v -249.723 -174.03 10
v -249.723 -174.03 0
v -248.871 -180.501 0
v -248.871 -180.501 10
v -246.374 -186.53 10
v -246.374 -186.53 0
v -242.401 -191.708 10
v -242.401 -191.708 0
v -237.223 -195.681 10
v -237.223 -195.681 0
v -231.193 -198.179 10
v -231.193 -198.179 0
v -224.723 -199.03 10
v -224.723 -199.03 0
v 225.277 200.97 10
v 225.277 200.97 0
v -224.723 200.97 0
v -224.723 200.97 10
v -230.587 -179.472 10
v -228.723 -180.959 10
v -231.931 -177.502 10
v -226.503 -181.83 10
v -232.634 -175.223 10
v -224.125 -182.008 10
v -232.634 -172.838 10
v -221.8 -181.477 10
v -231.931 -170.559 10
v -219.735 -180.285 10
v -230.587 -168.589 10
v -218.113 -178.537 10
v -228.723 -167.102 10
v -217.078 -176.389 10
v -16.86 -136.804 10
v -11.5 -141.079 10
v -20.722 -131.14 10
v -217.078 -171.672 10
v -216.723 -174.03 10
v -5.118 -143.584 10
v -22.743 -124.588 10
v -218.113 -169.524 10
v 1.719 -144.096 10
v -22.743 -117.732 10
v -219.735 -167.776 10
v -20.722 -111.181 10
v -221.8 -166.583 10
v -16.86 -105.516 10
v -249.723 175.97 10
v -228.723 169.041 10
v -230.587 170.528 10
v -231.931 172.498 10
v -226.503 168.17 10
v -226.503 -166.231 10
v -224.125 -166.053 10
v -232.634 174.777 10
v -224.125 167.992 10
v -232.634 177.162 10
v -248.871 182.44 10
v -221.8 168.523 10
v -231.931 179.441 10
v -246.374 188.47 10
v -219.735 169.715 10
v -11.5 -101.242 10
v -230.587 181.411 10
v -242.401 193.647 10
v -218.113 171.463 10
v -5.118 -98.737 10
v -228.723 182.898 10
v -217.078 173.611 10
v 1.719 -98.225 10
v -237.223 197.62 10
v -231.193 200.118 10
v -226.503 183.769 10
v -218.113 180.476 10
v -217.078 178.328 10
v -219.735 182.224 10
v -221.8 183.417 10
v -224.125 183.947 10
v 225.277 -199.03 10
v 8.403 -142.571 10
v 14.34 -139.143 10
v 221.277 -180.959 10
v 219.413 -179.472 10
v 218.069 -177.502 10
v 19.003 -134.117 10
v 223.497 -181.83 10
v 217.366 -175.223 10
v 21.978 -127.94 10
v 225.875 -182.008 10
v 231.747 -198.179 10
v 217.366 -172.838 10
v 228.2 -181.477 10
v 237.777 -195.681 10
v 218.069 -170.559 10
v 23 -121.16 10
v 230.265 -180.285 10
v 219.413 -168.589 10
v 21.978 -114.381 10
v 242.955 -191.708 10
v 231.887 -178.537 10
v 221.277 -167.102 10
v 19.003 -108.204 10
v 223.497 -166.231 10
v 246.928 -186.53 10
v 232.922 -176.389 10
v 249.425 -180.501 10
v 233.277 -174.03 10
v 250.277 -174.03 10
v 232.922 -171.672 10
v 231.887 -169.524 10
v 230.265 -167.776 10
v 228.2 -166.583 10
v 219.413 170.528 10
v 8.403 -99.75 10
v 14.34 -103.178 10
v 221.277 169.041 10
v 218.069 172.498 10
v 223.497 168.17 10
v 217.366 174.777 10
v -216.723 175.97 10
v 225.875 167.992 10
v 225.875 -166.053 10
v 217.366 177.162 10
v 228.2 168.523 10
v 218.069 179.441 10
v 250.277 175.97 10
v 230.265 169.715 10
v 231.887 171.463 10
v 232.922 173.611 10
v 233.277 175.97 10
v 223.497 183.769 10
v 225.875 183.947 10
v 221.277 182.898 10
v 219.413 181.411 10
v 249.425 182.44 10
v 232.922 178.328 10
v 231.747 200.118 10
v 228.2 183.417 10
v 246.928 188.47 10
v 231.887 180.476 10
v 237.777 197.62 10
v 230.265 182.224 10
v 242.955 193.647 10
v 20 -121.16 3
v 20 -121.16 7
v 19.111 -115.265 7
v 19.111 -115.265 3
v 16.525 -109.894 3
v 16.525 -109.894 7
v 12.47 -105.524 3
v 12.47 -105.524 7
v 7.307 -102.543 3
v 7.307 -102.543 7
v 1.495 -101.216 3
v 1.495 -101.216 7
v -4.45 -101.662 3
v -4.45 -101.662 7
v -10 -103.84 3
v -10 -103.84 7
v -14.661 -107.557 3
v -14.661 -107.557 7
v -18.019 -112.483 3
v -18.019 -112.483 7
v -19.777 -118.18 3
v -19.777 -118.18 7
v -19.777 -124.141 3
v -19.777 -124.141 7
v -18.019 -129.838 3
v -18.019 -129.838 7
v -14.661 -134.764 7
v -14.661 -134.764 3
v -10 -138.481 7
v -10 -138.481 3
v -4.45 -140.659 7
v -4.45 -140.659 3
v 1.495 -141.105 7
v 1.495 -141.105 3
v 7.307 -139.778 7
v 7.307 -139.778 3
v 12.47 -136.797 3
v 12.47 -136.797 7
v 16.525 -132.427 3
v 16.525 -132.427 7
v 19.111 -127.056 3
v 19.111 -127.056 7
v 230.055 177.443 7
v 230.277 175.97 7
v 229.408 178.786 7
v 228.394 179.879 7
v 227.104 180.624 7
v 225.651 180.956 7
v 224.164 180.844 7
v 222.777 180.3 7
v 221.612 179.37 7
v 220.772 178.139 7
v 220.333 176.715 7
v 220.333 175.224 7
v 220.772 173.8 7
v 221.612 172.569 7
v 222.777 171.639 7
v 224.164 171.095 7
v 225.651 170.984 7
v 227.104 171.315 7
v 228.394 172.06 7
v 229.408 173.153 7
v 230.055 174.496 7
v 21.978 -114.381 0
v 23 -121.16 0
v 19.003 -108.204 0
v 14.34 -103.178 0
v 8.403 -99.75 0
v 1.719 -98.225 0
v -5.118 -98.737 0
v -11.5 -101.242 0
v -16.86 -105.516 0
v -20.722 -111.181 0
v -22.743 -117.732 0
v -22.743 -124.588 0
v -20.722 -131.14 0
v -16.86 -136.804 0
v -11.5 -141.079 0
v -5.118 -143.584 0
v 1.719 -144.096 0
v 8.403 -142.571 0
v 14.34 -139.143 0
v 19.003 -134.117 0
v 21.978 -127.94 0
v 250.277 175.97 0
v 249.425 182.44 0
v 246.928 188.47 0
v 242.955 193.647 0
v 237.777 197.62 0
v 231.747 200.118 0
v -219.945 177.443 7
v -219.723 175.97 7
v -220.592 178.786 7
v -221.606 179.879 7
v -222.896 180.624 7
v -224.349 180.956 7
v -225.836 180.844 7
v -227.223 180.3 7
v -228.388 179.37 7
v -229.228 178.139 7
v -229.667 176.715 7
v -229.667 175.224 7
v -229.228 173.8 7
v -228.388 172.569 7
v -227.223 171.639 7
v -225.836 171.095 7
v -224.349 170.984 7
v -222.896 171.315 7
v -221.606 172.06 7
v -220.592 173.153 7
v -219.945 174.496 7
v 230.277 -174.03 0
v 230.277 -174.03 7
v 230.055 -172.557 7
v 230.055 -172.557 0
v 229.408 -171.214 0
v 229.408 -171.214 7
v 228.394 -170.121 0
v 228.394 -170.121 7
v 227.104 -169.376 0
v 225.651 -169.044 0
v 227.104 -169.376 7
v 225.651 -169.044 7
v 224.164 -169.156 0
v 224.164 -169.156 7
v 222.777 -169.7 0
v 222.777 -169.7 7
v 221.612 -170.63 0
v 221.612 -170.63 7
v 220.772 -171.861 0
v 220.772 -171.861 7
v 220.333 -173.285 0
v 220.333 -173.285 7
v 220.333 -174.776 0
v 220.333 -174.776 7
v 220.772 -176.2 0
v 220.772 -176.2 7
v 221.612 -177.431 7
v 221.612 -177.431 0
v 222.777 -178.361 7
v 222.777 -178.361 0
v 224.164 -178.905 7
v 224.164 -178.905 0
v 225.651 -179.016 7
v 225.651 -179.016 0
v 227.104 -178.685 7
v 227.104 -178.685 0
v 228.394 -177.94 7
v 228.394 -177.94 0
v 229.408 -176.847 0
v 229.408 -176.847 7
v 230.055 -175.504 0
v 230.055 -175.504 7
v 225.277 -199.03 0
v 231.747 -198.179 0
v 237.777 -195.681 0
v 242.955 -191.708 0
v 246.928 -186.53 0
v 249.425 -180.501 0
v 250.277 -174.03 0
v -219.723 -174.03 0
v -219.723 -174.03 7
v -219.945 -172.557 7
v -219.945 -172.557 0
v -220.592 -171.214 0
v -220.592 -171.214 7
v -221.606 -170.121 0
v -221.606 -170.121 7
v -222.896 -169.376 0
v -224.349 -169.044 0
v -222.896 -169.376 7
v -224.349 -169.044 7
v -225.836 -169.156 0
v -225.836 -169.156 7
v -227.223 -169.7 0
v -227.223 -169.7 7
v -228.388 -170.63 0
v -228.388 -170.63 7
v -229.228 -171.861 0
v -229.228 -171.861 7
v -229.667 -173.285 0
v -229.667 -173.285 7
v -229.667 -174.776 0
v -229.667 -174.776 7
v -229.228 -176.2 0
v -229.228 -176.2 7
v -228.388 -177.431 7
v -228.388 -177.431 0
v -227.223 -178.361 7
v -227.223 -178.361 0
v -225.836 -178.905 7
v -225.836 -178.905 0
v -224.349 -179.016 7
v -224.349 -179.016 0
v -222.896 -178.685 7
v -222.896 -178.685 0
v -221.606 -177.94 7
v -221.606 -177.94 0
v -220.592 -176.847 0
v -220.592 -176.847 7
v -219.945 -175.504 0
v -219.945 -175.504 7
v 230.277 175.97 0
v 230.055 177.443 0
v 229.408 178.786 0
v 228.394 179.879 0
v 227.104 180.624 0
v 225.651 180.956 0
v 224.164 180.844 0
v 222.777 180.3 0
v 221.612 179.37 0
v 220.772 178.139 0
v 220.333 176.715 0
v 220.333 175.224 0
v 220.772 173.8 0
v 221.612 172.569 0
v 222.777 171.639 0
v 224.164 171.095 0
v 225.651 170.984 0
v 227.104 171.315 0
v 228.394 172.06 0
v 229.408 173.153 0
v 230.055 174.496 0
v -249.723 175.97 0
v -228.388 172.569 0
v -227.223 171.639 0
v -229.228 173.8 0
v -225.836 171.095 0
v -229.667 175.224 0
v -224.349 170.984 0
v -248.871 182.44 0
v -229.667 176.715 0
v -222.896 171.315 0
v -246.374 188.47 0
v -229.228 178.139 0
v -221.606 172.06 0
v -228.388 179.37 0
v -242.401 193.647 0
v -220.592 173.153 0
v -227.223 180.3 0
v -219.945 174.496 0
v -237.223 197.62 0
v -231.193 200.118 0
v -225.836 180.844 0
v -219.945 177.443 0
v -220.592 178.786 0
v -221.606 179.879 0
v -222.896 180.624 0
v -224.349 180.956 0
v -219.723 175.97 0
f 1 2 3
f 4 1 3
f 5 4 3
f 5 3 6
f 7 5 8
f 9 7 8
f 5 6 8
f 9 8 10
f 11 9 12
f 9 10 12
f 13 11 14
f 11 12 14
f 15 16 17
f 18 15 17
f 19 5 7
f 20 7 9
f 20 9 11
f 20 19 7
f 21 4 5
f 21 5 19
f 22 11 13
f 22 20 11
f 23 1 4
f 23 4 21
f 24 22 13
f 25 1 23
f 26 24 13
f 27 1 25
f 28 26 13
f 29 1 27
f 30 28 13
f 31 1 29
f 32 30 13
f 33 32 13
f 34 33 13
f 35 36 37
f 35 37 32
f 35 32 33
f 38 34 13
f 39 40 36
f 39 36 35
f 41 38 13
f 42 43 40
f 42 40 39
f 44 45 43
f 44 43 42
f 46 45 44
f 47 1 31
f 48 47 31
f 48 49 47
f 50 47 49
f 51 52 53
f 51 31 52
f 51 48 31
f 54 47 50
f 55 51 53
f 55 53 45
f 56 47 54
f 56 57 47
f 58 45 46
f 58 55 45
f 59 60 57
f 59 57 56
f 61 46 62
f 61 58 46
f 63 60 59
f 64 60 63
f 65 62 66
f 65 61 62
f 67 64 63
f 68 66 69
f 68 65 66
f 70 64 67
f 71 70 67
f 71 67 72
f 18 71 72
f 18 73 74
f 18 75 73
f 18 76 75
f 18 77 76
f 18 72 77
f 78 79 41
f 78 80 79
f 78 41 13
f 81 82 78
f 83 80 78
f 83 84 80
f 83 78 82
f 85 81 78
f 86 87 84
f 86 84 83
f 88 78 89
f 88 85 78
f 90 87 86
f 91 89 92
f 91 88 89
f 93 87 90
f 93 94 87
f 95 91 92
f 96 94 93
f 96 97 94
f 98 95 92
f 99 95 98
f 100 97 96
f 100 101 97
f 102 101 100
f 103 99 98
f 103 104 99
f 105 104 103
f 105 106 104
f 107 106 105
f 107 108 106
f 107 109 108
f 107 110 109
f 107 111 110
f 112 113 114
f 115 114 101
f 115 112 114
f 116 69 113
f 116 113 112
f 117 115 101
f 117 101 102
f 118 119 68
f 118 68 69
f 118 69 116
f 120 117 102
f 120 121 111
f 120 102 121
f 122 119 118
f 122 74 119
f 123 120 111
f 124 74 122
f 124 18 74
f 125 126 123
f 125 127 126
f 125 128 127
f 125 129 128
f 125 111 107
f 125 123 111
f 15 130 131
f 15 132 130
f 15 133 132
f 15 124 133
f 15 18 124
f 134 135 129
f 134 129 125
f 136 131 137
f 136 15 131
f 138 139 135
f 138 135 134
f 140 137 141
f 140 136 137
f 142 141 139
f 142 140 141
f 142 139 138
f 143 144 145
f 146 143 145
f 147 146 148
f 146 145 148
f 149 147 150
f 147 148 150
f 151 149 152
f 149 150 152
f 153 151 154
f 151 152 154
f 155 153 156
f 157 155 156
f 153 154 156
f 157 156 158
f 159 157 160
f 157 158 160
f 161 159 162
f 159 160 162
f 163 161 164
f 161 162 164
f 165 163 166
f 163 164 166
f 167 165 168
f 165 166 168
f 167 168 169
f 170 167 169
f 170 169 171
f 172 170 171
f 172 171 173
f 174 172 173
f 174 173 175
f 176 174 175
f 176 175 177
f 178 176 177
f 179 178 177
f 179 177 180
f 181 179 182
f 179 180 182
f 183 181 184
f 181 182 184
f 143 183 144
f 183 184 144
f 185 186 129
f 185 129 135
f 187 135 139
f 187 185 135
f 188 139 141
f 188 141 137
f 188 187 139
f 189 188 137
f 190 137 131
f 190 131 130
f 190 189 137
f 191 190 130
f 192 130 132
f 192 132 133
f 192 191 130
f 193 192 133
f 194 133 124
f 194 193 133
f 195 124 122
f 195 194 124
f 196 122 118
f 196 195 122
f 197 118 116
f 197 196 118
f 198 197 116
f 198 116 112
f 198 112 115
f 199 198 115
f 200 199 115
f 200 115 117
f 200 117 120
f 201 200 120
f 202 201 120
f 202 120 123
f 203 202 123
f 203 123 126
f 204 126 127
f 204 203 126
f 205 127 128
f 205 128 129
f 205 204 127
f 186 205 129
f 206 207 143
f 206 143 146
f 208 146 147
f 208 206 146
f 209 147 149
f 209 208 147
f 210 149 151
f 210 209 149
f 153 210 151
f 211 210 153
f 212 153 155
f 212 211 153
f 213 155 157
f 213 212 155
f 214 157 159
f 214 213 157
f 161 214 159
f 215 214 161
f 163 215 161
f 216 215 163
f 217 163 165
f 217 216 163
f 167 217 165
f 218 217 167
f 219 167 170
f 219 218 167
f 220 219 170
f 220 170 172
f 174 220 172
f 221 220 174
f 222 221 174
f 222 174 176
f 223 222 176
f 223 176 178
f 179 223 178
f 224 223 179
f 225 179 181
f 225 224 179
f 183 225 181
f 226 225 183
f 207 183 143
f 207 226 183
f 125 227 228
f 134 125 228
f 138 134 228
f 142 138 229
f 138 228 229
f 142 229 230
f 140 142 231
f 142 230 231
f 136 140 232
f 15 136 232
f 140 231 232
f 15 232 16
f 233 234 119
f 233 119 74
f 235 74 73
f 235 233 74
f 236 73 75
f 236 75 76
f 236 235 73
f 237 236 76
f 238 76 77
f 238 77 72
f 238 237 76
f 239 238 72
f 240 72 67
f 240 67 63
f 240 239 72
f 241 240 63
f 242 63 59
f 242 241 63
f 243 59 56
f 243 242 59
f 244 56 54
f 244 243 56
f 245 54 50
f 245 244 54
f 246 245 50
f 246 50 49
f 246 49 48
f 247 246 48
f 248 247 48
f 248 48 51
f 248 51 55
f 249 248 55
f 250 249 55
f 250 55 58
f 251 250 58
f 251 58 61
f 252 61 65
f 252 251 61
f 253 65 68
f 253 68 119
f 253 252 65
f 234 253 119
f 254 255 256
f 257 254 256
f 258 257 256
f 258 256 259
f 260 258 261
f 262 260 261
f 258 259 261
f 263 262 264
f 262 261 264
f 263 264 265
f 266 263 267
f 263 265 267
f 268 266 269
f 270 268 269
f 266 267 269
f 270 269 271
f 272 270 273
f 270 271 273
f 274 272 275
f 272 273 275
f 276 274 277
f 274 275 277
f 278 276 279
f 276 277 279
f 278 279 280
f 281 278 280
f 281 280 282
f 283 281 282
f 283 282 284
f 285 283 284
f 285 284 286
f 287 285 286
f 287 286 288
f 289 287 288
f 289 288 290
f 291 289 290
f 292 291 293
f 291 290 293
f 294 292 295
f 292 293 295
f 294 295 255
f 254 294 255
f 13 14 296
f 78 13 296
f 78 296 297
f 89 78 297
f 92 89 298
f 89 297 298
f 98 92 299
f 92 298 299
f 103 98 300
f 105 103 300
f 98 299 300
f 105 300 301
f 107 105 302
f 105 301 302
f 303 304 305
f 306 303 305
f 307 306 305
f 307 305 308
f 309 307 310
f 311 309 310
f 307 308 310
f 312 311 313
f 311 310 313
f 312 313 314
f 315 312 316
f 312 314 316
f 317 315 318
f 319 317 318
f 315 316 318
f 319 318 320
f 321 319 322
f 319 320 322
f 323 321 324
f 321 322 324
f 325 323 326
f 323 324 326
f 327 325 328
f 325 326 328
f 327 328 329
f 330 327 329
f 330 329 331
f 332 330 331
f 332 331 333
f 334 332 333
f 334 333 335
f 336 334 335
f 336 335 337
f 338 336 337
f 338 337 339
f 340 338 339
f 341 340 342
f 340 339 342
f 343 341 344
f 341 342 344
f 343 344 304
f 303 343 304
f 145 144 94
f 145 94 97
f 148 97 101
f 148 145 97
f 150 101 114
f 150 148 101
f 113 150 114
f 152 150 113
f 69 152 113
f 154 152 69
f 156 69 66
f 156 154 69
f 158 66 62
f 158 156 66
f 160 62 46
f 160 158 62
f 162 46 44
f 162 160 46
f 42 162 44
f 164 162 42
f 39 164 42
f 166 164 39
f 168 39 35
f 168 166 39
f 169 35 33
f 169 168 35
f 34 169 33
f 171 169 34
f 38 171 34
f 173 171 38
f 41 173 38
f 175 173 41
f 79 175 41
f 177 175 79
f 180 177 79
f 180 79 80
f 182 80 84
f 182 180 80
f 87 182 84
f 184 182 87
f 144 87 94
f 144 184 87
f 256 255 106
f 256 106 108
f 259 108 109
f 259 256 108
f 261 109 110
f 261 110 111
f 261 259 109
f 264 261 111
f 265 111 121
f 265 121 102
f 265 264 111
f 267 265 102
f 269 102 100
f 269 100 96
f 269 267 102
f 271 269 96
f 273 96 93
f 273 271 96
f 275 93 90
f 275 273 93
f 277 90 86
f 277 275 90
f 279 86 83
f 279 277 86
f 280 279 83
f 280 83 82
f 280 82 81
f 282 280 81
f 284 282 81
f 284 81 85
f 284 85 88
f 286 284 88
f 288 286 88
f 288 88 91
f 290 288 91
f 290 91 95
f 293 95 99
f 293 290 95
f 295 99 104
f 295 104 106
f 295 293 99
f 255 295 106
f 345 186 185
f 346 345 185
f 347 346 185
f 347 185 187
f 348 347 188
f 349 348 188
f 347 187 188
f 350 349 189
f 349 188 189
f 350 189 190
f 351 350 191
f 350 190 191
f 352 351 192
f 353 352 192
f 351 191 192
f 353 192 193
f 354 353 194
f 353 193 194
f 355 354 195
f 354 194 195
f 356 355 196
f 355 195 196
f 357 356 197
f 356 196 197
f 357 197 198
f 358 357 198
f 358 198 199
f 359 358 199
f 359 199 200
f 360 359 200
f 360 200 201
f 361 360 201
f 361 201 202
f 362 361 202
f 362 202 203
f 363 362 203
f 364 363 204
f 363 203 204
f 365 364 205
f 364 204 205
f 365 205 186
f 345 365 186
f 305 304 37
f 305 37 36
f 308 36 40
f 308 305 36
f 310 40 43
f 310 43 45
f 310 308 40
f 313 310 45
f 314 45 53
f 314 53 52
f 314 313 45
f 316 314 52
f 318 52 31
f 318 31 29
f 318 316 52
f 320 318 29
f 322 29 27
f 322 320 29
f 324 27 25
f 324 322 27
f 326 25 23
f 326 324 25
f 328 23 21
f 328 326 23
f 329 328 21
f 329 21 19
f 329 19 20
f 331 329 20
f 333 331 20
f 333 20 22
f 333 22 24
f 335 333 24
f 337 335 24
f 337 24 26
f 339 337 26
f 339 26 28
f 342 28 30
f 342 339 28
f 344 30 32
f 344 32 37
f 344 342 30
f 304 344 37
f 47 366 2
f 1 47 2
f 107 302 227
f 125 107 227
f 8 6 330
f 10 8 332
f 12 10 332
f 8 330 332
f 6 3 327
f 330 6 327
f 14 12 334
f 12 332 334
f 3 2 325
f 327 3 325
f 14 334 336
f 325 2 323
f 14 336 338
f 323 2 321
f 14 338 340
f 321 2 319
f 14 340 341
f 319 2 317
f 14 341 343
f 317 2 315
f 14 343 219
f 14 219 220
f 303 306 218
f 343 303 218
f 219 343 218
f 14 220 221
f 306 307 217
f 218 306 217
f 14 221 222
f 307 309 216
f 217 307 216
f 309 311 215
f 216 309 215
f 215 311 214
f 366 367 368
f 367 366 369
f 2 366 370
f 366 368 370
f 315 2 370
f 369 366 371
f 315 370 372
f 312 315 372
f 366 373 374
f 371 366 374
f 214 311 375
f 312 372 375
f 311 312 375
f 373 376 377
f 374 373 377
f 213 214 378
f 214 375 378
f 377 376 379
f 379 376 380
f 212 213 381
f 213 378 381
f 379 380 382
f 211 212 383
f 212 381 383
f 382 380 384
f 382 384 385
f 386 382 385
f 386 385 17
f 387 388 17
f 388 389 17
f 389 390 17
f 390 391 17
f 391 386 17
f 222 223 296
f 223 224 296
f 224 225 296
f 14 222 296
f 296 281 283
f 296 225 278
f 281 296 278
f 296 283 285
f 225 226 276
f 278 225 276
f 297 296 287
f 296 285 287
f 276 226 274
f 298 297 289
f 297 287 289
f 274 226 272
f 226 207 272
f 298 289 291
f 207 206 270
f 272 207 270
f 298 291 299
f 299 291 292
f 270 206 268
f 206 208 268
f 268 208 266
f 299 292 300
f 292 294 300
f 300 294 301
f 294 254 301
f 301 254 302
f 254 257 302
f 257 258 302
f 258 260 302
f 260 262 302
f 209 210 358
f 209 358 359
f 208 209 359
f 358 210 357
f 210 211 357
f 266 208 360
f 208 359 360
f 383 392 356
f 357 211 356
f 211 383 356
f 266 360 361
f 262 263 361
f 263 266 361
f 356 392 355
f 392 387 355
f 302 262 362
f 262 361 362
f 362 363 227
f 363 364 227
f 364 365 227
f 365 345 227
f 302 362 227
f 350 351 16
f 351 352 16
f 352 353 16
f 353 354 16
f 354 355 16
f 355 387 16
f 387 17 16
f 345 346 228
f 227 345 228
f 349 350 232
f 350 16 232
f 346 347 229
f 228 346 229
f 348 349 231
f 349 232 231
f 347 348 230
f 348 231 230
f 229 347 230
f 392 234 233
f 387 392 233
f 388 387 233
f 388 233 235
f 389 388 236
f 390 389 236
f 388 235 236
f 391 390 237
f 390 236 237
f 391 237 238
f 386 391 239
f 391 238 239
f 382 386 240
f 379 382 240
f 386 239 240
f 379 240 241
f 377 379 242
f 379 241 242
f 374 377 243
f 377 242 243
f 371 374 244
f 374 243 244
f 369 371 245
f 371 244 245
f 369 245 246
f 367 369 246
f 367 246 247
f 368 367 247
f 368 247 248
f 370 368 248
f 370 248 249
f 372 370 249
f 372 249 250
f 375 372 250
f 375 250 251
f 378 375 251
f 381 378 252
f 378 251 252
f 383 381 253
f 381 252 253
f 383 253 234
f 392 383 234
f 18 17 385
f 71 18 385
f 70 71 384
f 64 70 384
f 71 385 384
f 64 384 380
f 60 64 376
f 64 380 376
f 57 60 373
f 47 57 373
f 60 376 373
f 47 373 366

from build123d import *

# Parameters (mm, degrees)
BOSS_EXTRU_1_DEPTH      = 10
ESQUISSE3_R             = 5
ENL_V_MAT_EXTRU_1_DEPTH = 10
CHANFREIN1_SIZE         = 3
ESQUISSE4_R             = 20
ENL_V_MAT_EXTRU_2_DEPTH = 10
CHANFREIN2_SIZE         = 3


with BuildPart() as part:
    # Esquisse1 → Boss.-Extru.1 (new body)
    with BuildSketch(Plane.XY):
        with BuildLine():
            Line((-224.722989012, -199.030461543), (225.277010988, -199.030461543))
            ThreePointArc((225.277010988, -199.030461543), (242.954680517, -191.708131073), (250.277010988, -174.030461543))
            Line((250.277010988, -174.030461543), (250.277010988, 175.969538457))
            ThreePointArc((250.277010988, 175.969538457), (242.954680517, 193.647207986), (225.277010988, 200.969538457))
            Line((225.277010988, 200.969538457), (-224.722989012, 200.969538457))
            ThreePointArc((-224.722989012, 200.969538457), (-242.400658542, 193.647207986), (-249.722989012, 175.969538457))
            Line((-249.722989012, 175.969538457), (-249.722989012, -174.030461543))
            ThreePointArc((-249.722989012, -174.030461543), (-242.400658542, -191.708131073), (-224.722989012, -199.030461543))
        make_face()
    extrude(amount=BOSS_EXTRU_1_DEPTH)

    # Esquisse3 → Enlèv. mat.-Extru.1 (cut)
    with BuildSketch(Plane.XY.offset(10)):
        with Locations((-224.722989012, -174.030461543)):
            Circle(ESQUISSE3_R)
        with Locations((225.277010988, -174.030461543)):
            Circle(ESQUISSE3_R)
        with Locations((225.277010988, 175.969538457)):
            Circle(ESQUISSE3_R)
        with Locations((-224.722989012, 175.969538457)):
            Circle(ESQUISSE3_R)
    extrude(amount=-ENL_V_MAT_EXTRU_1_DEPTH, mode=Mode.SUBTRACT)

    # Chanfrein1
    chanfrein1_edges = [part.edges().sort_by_distance(p)[0] for p in [
        (-229.722989012, 175.969538457, 10),
        (220.277010988, 175.969538457, 10),
        (220.277010988, -174.030461543, 10),
        (-229.722989012, -174.030461543, 10),
    ]]
    chamfer(chanfrein1_edges, length=CHANFREIN1_SIZE)

    # Esquisse4 → Enlèv. mat.-Extru.2 (cut)
    with BuildSketch(Plane.XY.offset(10)):
        with Locations((0, -121.160461543)):
            Circle(ESQUISSE4_R)
    extrude(amount=-ENL_V_MAT_EXTRU_2_DEPTH, mode=Mode.SUBTRACT)

    # Chanfrein2
    chanfrein2_edges = [part.edges().sort_by_distance(p)[0] for p in [
        (-20, -121.160461543, 0),
        (-20, -121.160461543, 10),
    ]]
    chamfer(chanfrein2_edges, length=CHANFREIN2_SIZE)


solid = part.part
